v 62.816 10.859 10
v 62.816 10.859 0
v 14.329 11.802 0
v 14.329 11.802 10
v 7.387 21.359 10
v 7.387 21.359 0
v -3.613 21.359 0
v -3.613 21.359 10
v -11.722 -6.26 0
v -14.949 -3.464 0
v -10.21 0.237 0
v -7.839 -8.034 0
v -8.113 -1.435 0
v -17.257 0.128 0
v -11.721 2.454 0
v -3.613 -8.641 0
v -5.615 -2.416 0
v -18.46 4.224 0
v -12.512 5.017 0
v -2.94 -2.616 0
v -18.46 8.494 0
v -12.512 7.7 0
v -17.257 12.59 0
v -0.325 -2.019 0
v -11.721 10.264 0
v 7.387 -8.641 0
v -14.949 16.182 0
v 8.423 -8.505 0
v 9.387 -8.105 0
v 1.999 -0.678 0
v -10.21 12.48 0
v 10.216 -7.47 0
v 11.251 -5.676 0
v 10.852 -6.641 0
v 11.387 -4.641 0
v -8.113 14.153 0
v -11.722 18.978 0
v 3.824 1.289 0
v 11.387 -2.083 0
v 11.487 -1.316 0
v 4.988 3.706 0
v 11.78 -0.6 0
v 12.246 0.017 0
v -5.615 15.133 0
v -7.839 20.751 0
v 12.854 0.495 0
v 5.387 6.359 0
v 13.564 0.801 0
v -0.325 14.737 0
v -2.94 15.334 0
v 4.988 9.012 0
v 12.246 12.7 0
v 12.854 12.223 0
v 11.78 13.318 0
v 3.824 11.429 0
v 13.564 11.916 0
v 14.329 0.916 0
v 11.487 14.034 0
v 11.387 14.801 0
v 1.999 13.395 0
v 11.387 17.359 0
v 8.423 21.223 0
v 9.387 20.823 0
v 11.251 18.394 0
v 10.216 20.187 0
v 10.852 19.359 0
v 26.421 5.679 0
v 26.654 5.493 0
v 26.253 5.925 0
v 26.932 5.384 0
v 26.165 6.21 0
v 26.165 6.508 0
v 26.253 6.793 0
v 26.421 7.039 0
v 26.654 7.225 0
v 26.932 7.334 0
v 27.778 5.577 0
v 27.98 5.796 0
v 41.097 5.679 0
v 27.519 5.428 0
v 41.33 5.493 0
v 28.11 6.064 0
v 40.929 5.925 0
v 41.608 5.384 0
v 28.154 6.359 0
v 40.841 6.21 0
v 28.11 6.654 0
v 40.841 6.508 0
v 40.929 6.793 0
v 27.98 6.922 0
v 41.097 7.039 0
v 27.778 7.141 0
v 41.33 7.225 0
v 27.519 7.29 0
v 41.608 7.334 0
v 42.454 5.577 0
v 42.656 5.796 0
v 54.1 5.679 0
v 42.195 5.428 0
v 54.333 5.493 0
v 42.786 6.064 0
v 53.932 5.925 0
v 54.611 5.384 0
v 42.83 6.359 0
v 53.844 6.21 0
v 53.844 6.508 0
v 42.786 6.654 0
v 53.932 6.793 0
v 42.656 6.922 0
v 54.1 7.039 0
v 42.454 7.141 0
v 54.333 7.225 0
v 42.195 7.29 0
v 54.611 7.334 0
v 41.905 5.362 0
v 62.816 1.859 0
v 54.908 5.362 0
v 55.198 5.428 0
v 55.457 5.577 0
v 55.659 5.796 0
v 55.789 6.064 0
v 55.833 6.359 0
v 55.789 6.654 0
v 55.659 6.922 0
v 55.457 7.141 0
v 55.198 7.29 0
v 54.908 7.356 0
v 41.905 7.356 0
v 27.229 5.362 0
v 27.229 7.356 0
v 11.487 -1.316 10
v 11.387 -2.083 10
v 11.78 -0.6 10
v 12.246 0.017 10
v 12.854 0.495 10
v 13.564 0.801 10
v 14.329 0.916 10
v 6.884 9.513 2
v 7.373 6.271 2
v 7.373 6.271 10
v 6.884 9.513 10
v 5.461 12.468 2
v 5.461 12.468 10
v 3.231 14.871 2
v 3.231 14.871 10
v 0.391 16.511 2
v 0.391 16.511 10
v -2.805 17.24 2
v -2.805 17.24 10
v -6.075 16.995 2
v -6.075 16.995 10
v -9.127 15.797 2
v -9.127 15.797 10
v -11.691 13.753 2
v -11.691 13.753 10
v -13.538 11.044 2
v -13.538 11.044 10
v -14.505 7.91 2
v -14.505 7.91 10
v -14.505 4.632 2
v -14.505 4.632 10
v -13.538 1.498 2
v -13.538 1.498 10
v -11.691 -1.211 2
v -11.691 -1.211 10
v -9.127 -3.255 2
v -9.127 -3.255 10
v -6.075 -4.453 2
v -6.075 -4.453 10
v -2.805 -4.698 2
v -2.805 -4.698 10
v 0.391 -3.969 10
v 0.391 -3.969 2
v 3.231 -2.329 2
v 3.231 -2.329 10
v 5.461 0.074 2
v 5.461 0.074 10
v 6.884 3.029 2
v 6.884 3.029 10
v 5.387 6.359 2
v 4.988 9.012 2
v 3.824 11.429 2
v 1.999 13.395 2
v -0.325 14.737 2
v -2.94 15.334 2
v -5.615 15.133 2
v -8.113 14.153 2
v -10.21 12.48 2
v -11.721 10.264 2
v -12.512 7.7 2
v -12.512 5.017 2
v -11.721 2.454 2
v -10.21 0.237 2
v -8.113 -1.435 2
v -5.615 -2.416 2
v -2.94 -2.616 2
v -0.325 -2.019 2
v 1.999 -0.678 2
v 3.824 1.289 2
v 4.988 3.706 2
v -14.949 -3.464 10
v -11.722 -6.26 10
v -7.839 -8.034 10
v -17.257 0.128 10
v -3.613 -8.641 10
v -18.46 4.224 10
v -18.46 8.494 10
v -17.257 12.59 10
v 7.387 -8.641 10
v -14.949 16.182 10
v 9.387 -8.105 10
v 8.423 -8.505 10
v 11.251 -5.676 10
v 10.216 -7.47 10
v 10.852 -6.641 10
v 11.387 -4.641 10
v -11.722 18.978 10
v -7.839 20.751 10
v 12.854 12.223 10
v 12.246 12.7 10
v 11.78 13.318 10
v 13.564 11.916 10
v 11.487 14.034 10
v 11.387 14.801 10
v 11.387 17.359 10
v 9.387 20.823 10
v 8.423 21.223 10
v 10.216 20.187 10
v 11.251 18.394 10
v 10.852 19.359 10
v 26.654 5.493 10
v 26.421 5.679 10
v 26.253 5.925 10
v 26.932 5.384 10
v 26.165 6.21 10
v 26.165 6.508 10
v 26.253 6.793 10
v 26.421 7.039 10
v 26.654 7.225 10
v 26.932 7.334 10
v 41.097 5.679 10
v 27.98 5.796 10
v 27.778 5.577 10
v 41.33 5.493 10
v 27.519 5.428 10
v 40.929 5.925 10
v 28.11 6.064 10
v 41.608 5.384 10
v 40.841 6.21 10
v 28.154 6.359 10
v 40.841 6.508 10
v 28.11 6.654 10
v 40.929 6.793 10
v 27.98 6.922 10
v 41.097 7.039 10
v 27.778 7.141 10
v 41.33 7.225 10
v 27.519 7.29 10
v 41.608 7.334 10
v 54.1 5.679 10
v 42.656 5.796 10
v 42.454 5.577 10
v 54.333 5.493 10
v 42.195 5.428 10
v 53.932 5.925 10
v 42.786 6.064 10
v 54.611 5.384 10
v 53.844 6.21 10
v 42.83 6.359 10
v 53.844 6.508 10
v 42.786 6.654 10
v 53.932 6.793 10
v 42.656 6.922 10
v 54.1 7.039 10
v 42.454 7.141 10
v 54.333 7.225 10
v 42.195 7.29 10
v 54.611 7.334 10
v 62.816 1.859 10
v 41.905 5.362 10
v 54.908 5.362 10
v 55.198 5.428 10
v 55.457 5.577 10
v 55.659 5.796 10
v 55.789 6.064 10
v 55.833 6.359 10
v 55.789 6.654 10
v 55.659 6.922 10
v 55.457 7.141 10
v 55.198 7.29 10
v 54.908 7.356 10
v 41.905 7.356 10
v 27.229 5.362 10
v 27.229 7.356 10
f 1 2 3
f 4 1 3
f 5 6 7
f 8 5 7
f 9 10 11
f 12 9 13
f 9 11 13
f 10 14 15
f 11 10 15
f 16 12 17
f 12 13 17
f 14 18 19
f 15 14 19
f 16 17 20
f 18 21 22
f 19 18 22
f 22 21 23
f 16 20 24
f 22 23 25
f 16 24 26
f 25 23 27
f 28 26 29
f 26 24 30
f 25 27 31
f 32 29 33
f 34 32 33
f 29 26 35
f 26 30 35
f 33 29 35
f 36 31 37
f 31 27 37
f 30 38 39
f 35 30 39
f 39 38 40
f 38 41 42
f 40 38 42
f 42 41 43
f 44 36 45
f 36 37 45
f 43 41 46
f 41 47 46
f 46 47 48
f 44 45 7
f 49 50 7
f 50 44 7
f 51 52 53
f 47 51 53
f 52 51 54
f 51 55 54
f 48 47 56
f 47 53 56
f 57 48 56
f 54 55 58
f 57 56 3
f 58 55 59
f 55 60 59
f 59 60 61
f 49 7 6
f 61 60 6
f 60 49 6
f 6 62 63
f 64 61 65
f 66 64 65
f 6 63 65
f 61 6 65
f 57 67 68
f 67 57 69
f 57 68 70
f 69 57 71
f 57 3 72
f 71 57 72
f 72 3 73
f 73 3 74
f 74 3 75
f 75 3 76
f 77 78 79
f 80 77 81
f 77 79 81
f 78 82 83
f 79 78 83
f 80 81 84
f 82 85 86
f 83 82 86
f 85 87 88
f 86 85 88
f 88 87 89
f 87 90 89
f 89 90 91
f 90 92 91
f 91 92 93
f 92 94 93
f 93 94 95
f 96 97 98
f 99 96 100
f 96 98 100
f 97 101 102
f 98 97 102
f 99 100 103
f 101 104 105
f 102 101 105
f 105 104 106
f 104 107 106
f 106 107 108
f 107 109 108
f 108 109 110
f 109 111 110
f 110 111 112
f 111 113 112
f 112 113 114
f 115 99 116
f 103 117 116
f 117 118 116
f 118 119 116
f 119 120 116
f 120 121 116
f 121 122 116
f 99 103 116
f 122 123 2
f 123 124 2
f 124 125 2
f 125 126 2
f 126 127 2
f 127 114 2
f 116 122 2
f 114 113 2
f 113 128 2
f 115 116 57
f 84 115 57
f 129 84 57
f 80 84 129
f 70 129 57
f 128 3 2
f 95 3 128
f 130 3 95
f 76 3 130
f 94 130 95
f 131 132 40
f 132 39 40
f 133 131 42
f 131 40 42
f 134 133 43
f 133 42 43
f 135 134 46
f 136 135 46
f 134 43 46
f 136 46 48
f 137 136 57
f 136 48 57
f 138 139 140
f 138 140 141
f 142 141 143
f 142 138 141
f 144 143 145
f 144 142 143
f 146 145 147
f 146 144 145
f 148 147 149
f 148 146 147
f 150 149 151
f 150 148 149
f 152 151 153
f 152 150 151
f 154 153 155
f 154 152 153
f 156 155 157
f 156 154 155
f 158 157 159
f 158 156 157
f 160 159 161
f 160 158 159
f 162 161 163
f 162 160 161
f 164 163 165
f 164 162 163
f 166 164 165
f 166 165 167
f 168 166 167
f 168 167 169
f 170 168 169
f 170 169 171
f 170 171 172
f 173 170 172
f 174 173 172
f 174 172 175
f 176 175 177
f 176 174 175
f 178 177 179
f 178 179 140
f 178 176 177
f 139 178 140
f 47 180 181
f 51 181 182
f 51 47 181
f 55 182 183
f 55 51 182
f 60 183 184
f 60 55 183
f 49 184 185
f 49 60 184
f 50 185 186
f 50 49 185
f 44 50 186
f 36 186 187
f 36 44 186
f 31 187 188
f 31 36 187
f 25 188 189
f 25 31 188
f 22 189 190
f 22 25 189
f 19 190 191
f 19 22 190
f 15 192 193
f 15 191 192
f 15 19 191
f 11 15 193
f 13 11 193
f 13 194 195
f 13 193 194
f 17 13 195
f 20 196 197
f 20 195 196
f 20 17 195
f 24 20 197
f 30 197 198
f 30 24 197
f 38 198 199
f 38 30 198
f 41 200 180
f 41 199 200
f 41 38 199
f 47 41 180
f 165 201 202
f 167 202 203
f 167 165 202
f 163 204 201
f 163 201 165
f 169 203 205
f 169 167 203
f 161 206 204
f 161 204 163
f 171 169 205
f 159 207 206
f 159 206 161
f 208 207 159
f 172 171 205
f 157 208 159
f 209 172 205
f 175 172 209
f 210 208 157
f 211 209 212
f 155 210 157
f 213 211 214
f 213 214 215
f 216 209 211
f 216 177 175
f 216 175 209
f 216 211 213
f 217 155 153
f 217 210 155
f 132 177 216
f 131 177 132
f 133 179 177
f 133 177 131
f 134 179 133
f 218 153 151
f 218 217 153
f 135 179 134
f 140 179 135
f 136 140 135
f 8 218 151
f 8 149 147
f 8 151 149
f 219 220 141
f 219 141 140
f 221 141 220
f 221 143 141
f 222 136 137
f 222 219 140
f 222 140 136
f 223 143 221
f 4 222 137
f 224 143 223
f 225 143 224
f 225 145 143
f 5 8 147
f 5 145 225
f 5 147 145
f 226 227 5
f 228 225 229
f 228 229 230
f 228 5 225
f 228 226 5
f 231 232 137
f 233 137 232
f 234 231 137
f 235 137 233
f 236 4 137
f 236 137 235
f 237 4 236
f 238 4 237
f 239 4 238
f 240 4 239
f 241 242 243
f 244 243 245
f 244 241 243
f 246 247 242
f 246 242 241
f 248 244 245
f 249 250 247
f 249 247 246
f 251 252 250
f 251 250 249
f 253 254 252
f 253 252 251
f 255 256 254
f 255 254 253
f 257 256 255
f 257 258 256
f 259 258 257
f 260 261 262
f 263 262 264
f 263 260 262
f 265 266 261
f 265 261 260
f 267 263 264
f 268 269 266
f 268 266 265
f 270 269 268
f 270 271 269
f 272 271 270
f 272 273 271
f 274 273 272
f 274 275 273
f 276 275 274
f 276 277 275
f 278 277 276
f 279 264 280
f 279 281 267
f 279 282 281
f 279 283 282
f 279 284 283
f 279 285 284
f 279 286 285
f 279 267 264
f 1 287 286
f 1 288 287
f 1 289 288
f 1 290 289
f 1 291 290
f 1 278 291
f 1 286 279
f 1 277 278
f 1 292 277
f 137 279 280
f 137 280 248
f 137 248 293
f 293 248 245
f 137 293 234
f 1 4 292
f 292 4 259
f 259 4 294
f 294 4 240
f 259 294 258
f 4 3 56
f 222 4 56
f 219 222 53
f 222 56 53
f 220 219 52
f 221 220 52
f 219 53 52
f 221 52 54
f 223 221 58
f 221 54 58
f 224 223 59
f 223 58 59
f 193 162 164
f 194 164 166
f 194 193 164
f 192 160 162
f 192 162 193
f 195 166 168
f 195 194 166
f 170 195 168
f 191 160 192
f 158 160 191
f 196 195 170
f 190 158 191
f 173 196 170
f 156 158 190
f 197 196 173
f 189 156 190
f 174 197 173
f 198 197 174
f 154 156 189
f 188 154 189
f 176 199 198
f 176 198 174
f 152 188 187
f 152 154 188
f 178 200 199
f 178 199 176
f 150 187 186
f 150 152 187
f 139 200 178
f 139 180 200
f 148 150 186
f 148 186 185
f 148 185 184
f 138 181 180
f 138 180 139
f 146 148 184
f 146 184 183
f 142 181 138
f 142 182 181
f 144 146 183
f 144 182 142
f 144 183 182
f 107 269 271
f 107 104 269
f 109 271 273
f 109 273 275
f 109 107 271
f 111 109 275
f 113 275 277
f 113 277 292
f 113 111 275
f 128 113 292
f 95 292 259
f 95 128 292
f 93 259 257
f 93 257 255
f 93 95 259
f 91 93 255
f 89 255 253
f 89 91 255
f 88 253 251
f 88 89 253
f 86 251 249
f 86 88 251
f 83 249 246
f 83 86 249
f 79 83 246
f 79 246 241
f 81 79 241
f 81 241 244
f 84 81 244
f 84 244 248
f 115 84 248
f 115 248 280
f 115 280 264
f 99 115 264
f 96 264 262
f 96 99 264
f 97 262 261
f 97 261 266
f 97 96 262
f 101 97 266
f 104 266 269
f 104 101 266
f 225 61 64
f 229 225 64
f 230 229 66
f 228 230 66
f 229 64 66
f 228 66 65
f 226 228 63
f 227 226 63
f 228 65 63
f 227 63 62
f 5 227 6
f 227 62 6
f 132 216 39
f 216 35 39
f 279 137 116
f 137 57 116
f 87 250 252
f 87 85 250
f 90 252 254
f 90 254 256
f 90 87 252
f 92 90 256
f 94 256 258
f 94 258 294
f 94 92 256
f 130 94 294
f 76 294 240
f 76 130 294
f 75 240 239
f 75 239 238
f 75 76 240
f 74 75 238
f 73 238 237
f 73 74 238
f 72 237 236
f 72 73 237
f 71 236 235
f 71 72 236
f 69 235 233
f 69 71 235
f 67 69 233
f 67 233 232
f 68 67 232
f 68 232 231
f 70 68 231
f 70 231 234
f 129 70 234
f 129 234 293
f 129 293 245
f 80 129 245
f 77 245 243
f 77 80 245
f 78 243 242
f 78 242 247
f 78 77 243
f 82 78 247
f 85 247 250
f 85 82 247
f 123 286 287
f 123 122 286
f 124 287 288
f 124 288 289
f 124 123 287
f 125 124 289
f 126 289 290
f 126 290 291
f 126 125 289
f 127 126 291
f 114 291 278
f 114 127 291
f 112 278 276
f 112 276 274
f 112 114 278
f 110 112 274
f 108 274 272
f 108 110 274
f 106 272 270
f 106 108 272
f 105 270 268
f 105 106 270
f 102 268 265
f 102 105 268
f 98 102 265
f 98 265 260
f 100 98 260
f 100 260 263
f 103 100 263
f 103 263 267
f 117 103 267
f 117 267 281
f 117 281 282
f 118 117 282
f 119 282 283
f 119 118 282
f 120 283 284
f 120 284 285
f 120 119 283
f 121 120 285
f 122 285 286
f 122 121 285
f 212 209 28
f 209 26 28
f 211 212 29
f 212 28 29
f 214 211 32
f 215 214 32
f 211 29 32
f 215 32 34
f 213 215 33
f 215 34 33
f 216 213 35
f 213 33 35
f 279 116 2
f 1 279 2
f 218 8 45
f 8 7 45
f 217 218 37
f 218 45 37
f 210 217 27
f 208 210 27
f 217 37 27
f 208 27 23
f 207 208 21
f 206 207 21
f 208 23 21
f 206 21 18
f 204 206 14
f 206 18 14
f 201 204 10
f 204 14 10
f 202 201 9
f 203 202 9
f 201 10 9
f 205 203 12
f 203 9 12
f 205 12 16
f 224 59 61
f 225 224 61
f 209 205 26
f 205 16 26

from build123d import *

# Parameters (mm, degrees)
F0_R     = 9
F0_R_2   = 1
F1_DEPTH = 2
F4_DEPTH = 8
F3_R     = 11
F5_DEPTH = 8


with BuildPart() as f1:
    # F0 (on Top) → F1 (new body)
    with BuildSketch(Plane.XY):
        with BuildLine():
            Line((7.3873995355, 21.3588363291), (-3.6126004645, 21.3588363291))
            ThreePointArc((-3.6126004645, 21.3588363291), (-14.2192021823, 16.9654380469), (-18.6126004645, 6.3588363291))
            ThreePointArc((-18.6126004645, 6.3588363291), (-14.2192021823, -4.2477653887), (-3.6126004645, -8.6411636709))
            Line((-3.6126004645, -8.6411636709), (7.3873995355, -8.6411636709))
            ThreePointArc((7.3873995355, -8.6411636709), (10.2158266602, -7.4695907956), (11.3873995355, -4.6411636709))
            Line((11.3873995355, -4.6411636709), (11.3873995355, -2.0833974181))
            ThreePointArc((11.3873995355, -2.0833974181), (12.2455583984, 0.0172016735), (14.3290772311, 0.9160356132))
            Line((14.3290772311, 0.9160356132), (62.8159749994, 1.8588363291))
            Line((62.8159749994, 1.8588363291), (62.8159749994, 10.8588363291))
            Line((62.8159749994, 10.8588363291), (14.3290772311, 11.8016370451))
            ThreePointArc((14.3290772311, 11.8016370451), (12.2455583984, 12.7004709848), (11.3873995355, 14.8010700763))
            Line((11.3873995355, 14.8010700763), (11.3873995355, 17.3588363291))
            ThreePointArc((11.3873995355, 17.3588363291), (10.2158266602, 20.1872634539), (7.3873995355, 21.3588363291))
        make_face()
        with Locations((-3.6126004645, 6.3588363291)):
            Circle(F0_R, mode=Mode.SUBTRACT)
        with Locations((27.1540286045, 6.3588363291)):
            Circle(F0_R_2, mode=Mode.SUBTRACT)
        with Locations((41.830126385, 6.3588363291)):
            Circle(F0_R_2, mode=Mode.SUBTRACT)
        with Locations((54.8330286544, 6.3588363291)):
            Circle(F0_R_2, mode=Mode.SUBTRACT)
    extrude(amount=F1_DEPTH)

    # F4 (add): a face of the model
    f4_faces = [f1.faces().sort_by_distance(p)[0] for p in [
        (16.5282103985, 6.3588363291, 2),
    ]]
    extrude(f4_faces, amount=F4_DEPTH)

    # F3 (on offset) → F5 (cut)
    with BuildSketch(Plane.XY.offset(2)):
        with Locations((-3.6273910664, 6.2710107304)):
            Circle(F3_R)
    extrude(amount=F5_DEPTH, mode=Mode.SUBTRACT)


solid = f1.part
